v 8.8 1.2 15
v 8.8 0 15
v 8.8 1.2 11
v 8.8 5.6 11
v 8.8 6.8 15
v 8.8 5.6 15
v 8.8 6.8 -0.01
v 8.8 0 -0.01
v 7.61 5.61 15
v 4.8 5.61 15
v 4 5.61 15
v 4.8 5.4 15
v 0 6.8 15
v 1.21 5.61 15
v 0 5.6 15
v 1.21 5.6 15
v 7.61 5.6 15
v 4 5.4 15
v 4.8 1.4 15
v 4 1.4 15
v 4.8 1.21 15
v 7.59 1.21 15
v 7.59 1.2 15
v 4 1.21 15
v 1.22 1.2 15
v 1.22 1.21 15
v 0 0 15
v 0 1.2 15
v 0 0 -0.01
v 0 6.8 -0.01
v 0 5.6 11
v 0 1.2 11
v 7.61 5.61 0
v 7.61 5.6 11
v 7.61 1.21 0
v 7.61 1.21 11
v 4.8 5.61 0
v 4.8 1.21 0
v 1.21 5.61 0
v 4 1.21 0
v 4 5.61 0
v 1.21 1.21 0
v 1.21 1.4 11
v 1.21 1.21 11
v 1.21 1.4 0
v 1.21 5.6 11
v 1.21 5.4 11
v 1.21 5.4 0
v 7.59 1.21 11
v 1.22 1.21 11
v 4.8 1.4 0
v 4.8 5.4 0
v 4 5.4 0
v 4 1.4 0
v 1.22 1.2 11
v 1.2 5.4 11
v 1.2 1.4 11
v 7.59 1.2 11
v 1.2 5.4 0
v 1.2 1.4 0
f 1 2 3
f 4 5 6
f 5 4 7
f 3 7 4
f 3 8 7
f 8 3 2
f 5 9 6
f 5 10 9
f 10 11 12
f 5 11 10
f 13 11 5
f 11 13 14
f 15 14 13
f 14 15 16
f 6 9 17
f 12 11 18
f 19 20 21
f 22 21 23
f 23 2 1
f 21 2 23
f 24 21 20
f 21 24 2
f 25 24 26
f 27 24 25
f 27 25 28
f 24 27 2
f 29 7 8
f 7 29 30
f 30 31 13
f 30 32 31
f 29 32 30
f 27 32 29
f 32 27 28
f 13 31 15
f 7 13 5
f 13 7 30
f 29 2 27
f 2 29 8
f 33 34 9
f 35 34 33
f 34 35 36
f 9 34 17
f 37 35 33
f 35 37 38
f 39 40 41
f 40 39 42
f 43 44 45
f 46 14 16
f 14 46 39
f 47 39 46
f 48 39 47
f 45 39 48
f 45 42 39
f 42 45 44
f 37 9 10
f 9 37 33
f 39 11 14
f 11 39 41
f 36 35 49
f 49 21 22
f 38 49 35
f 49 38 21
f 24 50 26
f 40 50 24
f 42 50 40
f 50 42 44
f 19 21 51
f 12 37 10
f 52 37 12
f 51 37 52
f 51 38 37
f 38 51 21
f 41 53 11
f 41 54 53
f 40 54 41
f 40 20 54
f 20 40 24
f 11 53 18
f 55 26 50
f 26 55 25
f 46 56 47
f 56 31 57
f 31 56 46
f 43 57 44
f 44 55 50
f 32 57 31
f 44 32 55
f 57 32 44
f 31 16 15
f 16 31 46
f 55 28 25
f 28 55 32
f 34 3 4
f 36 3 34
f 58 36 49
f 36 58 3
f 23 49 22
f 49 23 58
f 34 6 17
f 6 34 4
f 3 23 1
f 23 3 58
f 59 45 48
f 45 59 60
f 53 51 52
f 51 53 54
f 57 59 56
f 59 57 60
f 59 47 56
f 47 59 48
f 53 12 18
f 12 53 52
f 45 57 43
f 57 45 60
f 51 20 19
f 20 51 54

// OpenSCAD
// file: ../../Base/Boxes.scad
// Fischertechnik Box Foundation
// Pre-designed Boxes

use <Constants.scad>

include <PlacementOptions.scad>

box190Width = 190;
box190Depth = 130;
box130Width = 130;
box130Depth = 95;

// Values are from an original ec3 box
topBottomDifference = 1.5;
outerHeight = 40;
baseThickness = 1.8;
innerHeight = outerHeight - baseThickness;
stackExcess = 5.7;
radius = 3.5;
wallThickness = 1.5;
tolerance = 0.2;

boxWallThickness = wallThickness;
boxBaseThickness = baseThickness;
boxWebWidth = 3.0;

// getBoxWallThickness()
// Gets the wall thickness of a Fischertechnik Box
function getBoxWallThickness() = boxWallThickness;

// getBoxUsageHeight(height = 38.2)
// Gets the usable height of a Fischertechnik box
// height = Outer height of the box from the bottom to the upper edge.
function getBoxUsageHeight(height = outerHeight) = height - baseThickness - stackExcess;

// getBoxInnerHeight()
// Gets the inner height of a Fischertechnik box, including the stack excess
function getBoxInnerHeight() = innerHeight;

// getBoxBaseThickness()
// Gets the thickness of the Fischertechnik box base.
function getBoxBaseThickness() = boxBaseThickness;

// getBoxWebWidth()
// Gets the width of a box web
function getBoxWebWidth() = boxWebWidth;

// getBox190Space()
// Gets the usable inner space of a Box 190 as an x/y-list
function getBox190Space() = [
    box190Width - 2*getBoxWallThickness() - topBottomDifference, 
    box190Depth - 2*getBoxWallThickness() - topBottomDifference ];

// RoundedCornerPlate(width, depth, height, radius)
// Creates a body plate with rounded corners for a box. Used
// also to create the complete box with the hull module.
// width = Width of the plate
// depth = depth of the plate 
// height = thickness of the plate
// radius = radius of the rounded corner
module RoundedCornerPlate(width, depth, height, radius) {
    translate([radius, radius])
    hull() {
        w = width-2*radius;
        d = depth-2*radius;
        cube([w, d, height]);
        cylinder(height, r=radius, $fn=getFragments());
        translate([w, 0])
            cylinder(height, r=radius, $fn=getFragments());
        translate([w, d])
            cylinder(height, r=radius, $fn=getFragments());
        translate([0, d])
            cylinder(height, r=radius, $fn=getFragments());
    }
}

// BoxBase(width, depth)
// Creates an empty stackable Fischertechnik compatible box
// width = Outer width of the box (190, 130, ...)
// depth = Outer depth of the box (130, 95, ...)

module BoxBase(width, depth, height=outerHeight) {    
    thinPlate = 0.01;

    innerHeight = height - baseThickness;    
    
    module Body(tolerance=tolerance) {
        hull() {
            // Bottom with tolerance to fit into the original boxes when stacked
            translate([-wallThickness+tolerance, -wallThickness+tolerance, -baseThickness])
                RoundedCornerPlate(width-topBottomDifference-2*tolerance, depth-topBottomDifference-2*tolerance, thinPlate, radius);
            
            // Top
            translate([-wallThickness-topBottomDifference/2, -wallThickness-topBottomDifference/2, innerHeight-thinPlate])
                RoundedCornerPlate(width, depth, thinPlate, radius);
         }
    }

    module Cutoff() {
        hull() {
            coWidth = width - 2*wallThickness;
            coDepth = depth - 2*wallThickness;
            
            // Bottom
            RoundedCornerPlate(coWidth-topBottomDifference, coDepth-topBottomDifference, thinPlate, radius);

            // Top
            translate([-topBottomDifference/2, -topBottomDifference/2, innerHeight+thinPlate]) 
                RoundedCornerPlate(coWidth, coDepth, thinPlate, radius);
        }
    }
    
    difference() {        
        Body();
        Cutoff();
        stackOffset = innerHeight - stackExcess;
        translate([0, 0, stackOffset + baseThickness])
            Body(tolerance=0);
    }
}

// Creates the Fischertechnik empty box 130x190 mm and places it at position 0,0
// 190x130 are the outer sizes, the inner space is slightly smaller. Use getBox190Space() to get the inner sizes.
// The box is positioned that the usable inner space is at the 0,0,0 position.

module Box190() {
    BoxBase(box190Width, box190Depth);
}

// Gets the usable inner space of a Box 130 as an x/y-list
function getBox130Space() = [
    box130Width - 2*getBoxWallThickness() - topBottomDifference, 
    box130Depth - 2*getBoxWallThickness() - topBottomDifference ];

// Creates the Fischertechnik empty box 95x130 mm and places it at position 0,0
// 190x130 are the outer sizes, the inner space is slightly smaller. Use getBox190Space() to get the inner sizes.
// The box is positioned that the usable inner space is at the 0,0,0 position.

module Box130() {
    BoxBase(box130Width, box130Depth);
}

// Creates a web at the specified box walls
// corner 0 = LowerLeft, 1 = UpperLeft, 2 = UpperRight, 3 = LowerRight
// side 0 = LeftOfCorner, 1 = RightOfCorner
// distance = Distance in mm from the corner
// boxSpace = inner width and depth of the box (default: Box 190)
// webWidth = length of the web (default is 3 mms)
// webThickness = thickness of the web (default is 1 mm)
// height = Height of the web (standard is getBoxUsageHeight())

module BoxWeb(corner, side, distance, boxSpace=getBox190Space(), webWidth=getBoxWebWidth(), webThickness=1.0, height=getBoxUsageHeight()) {
    sink = getBoxWallThickness()/2;

    width = (corner % 2 == 0) ? 
            (side == LeftOfCorner ? webWidth : webThickness) :
            (side == LeftOfCorner ? webThickness : webWidth);

    depth = (corner % 2 == 0) ? 
            (side == RightOfCorner ? webWidth : webThickness) :
            (side == RightOfCorner ? webThickness : webWidth);
    
    xDiff = corner == LowerLeft ? 
                (side == LeftOfCorner ? -sink : distance) :
            (corner == UpperLeft ?                
                (side == LeftOfCorner ? distance : -sink) :
            (corner == UpperRight ?
                (side == LeftOfCorner ? boxSpace.x-webWidth+sink : boxSpace.x-distance-webThickness) :
                (side == LeftOfCorner ? boxSpace.x-distance-webThickness: boxSpace.x-webWidth+sink)));

    yDiff = corner == LowerLeft ? 
                (side == RightOfCorner ? -sink : distance) :
            (corner == UpperLeft ?
                (side == RightOfCorner ? boxSpace.y-distance-webThickness : boxSpace.y-webWidth+sink) :
            (corner == UpperRight ?
                (side == RightOfCorner ? boxSpace.y-webWidth+sink : boxSpace.y-distance-webThickness) :
                (side == RightOfCorner ? distance : -sink)));
    
    translate([xDiff, yDiff, -getExcess()])
        cube([width, depth, height + 2*getExcess()]);
}
// file: ../../Base/Rotation.scad
// Fischertechnik Box Foundation
// Geometry Helpers Rotation

include <PlacementOptions.scad>

// getRotatedSpace(space, rotation=NoRotation)
// Rotates the space dependent on the specified rotation

function getRotatedSpace(space, rotation=NoRotation) = [
    (rotation == Rotate90 || rotation == Rotate270) ? space.y : space.x,
    (rotation == Rotate90 || rotation == Rotate270) ? space.x : space.y
];

// Rotates the given space around the fixed left lower corner
// space = the space the children needs as width/depth list [width,depth]
// rotation = 0 Rotate0 degrees, 1 Rotate90 degrees, 2 Rotate180 degrees, 3 Rotate270 degrees (equivalent to -90)

module RotateFix(space, rotation=NoRotation) {
    dy = (rotation == Rotate0 || rotation == Rotate270) ? 0 :
        (rotation == Rotate90) ? space.x :
        space.y;
    dx = (rotation < Rotate180) ? 0 :
        (rotation == Rotate180) ? space.x :
        space.y;
    
    translate([dx, dy, 0])
        rotate([0, 0, rotations[rotation]])
            children();
}
// file: ../../Base/Alignment.scad
// Fischertechnik Box Foundation
// Geometry Helpers Alignment

include <PlacementOptions.scad>

// getAlignedX(elementWidth, spaceWidth, align=AlignRight, offset=0)
// Gets the aligned X offset of an element with the given
// width in the given space.
// elementWidth = The width of the element to positon
// spaceWidth = The space where the element should be aligned
// align = 0 AlignLeft, 1 AlignCenter, 2 AlignRight
// offset = an optional offset from the aligned position. When
// aligned left or centered, then positive values are in X direction.
// When aligned right then positive values are in negative X direction.

function getAlignedX(elementWidth, spaceWidth, align=AlignRight, offset=0) =
    (align == AlignLeft) ?
        offset :
        ((align == AlignCenter) ?
        (spaceWidth - elementWidth)/2 + offset :
        spaceWidth - offset - elementWidth);

// getAlignedY(elementDepth, spaceDepth, align=AlignTop, offset=0)
// Gets the aligned Y offset of an element with the given
// depth in the given space.
// elementDepth = The depth of the element to positon
// spaceDepth = The space where the element should be aligned
// align = 0 AlignBottom, 1 AlignCenter, 2 AlignTop
// offset = an optional offset from the aligned position. When
// aligned bottom or centered, then positive values are in Y direction.
// When aligned top then positive values are in negative Y direction.

function getAlignedY(elementDepth, spaceDepth, align=AlignTop, offset=0) =
    (align == AlignBottom) ?
        offset :
        ((align == AlignCenter) ?
        (spaceDepth - elementDepth)/2 + offset :
        spaceDepth - offset - elementDepth);
// file: ../../Base/Placement.scad
// Fischertechnik Box Foundation
// Geometry Helpers Placement

use <Constants.scad>
use <Alignment.scad>
use <Rotation.scad>
use <Boxes.scad>

include <PlacementOptions.scad>

// Place(x=0, y=0, elementSpace=[0,0], alignX=AlignLeft, alignY=AlignBottom, rotation=Rotate0, boxSpace=getBox190Space())
// Places the child at the specified position
// y = Y-Position. This is a relative position when an X aligment is specified.
// x = X-Position. This is a relative position when an Y aligment is specified.
// elementSpace = space of the element to be placed [x,y]
// alignX = -1=NoAlign, 0 AlignLeft, 1 AlignCenter, 3 AlignRight (elementSpace and boxSpace required!)
// alignY = -1=NoAlign, 2 AlignBottom, 1 AlignCenter, 4 AlignTop (elementSpace and boxSpace required!)
// rotation = 0 Rotate0 0 degrees, 1 Rotate90 90 degrees, 
// 2 Rotate180 180 degrees, 3 Rotate270 270 degrees (equivalent to -90)
// boxSpace = Inner space of the box where the placement occurs [x,y] - default is Box 190x130 inner space

module Place(x=0, y=0, elementSpace=[0,0], 
  alignX=AlignLeft, alignY=AlignBottom, 
  rotation=NoRotation, boxSpace=getBox190Space()) {

    module Position(x, y, space, rotation=Rotate0) {
        translate([x, y, 0])
            RotateFix(space, rotation)
                children();
    }

    space = getRotatedSpace(elementSpace, rotation);
    alignedX = getAlignedX(space.x, boxSpace.x, alignX, x);
    alignedY = getAlignedY(space.y, boxSpace.y, alignY, y);
    Position(alignedX, alignedY, elementSpace, rotation)
        children();
}

// Center(space=getBox130Space(), elementSpace=[0,0])
// space = Space where the children is centered. For cylinder use centered=true and no elementSpace.
// elementSpace = space of the element to be centered [x,y]

module Center(space=getBox190Space(), elementSpace=[0,0]) {
    Place(elementSpace=elementSpace, boxSpace=space, alignX=AlignCenter, alignY=AlignCenter)
        children();
}

// CenterHorizontal(width=0, y=0, offset=0, space=getBox130Space())
// width = Width of the element to be placed.
// y = Y position of the element
// offset = Offset from the center position (negative will be left of the center)
// space = Space where the element is placed

module CenterHorizontal(width=0, y=0, offset=0, space=getBox190Space()) {
    Place(x=offset, y=y, elementSpace=[width, 0], boxSpace=space, alignX=AlignCenter)
        children(0);
}

// CenterVertical(depth=0, x=0, offset=0, space=getBox130Space())
// depth = Depth of the element to be placed.
// x = X position of the element
// offset = Offset from the center position (negative will be down of the center)
// space = Space where the element is placed

module CenterVertical(depth=0, x=0, offset=0, space=getBox190Space()) {
    Place(x=x, y=offset, elementSpace=[0, depth], boxSpace=space, alignY=AlignCenter)
        children(0);
}

// getIsVertical(align)
// True if the specified alignment needs a vertical orientation for a divider (AlignRight, AlignLeft)

function getIsVertical(align) = (align == AlignRight || align == AlignLeft);

// getIsHorizontal(align)
// True if the specified alignment needs a horizontal orientation for a divider (AlignTop, AlignBottom)

function getIsHorizontal(align) = (align == AlignTop || align == AlignBottom);
// file: ../../Base/PlacementOptions.scad
// Fischertechnik Box Foundation
// Placement Options

// Alignment
NoAlign = 0;
AlignLeft = 1;
AlignBottom = 2;
AlignCenter = 3;
AlignRight = 4;
AlignTop = 5;

// Element rotation degree steps
rotations = [0, -90, -180, -270];

// Rotation
NoRotation = 0;
Rotate0 = 0;
Rotate90 = 1;
Rotate180 = 2;
Rotate270 = 3;

// Docking (seen from above)
NoDock = -1;
DockLeft = 0;
DockTop = 1;
DockRight = 2;
DockCorner = 2;
DockBottom = 3;

// Web corners
LowerLeft = 0;
UpperLeft = 1;
UpperRight = 2;
LowerRight = 3;

// Web position relative to corner
LeftOfCorner = 0;
RightOfCorner = 1;
// file: ../../Base/Constants.scad
// Fischertechnik Box Foundation
// Constants

// Constant values necessary for multiple elements

// Base constants
dividerThickness = 1.2;
excess = 0.01;
fragments = 90;
tolerance = 0.8;

// Gets the thickness of a divider 
function getDividerThickness() = dividerThickness;

// Gets the excess that is used to merge walls into each other
function getExcess() = excess;

// Gets amount of fragments of a cylinder
function getFragments() = fragments;

// Gets the inner tolerance of a frame to each side
function getTolerance() = tolerance;


// Fischertechnik specific constants
axisDiameter = 4;
axisBottomDiameter = axisDiameter + 1;
axisTolerance = 0.2;

// Gets axis diameter of Fischertechnik axis
function getAxisDiameter() = axisDiameter;

// Gets axis diameter tolerance (subtracted for element axis)
function getAxisTolerance() = axisTolerance;

// Gets the axis diameter for standing axis
function getStandAxisDiameter() = getAxisDiameter() - getAxisTolerance();

// Gets axis bottom diameter for thicker part at the bottom
function getAxisBottomDiameter() = axisBottomDiameter;

standardEdgeDistance = 2.5;
standardWebDistance = 11.5;
standardCornerLength = 15;

// gets the standard distance to the wall of the box for dockable frames with webs
function getStandardEdgeDistance() = standardEdgeDistance;

// gets the standard distance of each web to the corner of the dockable frame
function getStandardWebDistance() = standardWebDistance;

// gets the standard length of the corner walls of a dockable frame
function getStandardCornerLength() = standardCornerLength;

tubeWallFactor = 0.8;

// gets the wall thickness of a tube.
function getTubeWallThickness() = tubeWallFactor * getDividerThickness();

smallPartsFrameHeight = 20;

// gets the frame height for docked small parts boxes.
function getSmallPartsFrameHeight() = smallPartsFrameHeight;

hubRingDiameter = 19.5;
hubRingLevelDiameter = 21;

// gets the diameter of a tube matching the inner ring of a wheel
function getHubRingDiameter() = hubRingDiameter;

// gets the diameter of a hub tube with a thicker diameter
function getHubRingLevelDiameter() = hubRingLevelDiameter;
// main file
// Fischertechnik Box Foundation
// ModelBase
// Test AxisMiddleSupport

use <../../Base/Constants.scad>
use <../../ModelBase/Complex.scad>

include <../../Base/PlacementOptions.scad>

AxisMiddleSupport();
